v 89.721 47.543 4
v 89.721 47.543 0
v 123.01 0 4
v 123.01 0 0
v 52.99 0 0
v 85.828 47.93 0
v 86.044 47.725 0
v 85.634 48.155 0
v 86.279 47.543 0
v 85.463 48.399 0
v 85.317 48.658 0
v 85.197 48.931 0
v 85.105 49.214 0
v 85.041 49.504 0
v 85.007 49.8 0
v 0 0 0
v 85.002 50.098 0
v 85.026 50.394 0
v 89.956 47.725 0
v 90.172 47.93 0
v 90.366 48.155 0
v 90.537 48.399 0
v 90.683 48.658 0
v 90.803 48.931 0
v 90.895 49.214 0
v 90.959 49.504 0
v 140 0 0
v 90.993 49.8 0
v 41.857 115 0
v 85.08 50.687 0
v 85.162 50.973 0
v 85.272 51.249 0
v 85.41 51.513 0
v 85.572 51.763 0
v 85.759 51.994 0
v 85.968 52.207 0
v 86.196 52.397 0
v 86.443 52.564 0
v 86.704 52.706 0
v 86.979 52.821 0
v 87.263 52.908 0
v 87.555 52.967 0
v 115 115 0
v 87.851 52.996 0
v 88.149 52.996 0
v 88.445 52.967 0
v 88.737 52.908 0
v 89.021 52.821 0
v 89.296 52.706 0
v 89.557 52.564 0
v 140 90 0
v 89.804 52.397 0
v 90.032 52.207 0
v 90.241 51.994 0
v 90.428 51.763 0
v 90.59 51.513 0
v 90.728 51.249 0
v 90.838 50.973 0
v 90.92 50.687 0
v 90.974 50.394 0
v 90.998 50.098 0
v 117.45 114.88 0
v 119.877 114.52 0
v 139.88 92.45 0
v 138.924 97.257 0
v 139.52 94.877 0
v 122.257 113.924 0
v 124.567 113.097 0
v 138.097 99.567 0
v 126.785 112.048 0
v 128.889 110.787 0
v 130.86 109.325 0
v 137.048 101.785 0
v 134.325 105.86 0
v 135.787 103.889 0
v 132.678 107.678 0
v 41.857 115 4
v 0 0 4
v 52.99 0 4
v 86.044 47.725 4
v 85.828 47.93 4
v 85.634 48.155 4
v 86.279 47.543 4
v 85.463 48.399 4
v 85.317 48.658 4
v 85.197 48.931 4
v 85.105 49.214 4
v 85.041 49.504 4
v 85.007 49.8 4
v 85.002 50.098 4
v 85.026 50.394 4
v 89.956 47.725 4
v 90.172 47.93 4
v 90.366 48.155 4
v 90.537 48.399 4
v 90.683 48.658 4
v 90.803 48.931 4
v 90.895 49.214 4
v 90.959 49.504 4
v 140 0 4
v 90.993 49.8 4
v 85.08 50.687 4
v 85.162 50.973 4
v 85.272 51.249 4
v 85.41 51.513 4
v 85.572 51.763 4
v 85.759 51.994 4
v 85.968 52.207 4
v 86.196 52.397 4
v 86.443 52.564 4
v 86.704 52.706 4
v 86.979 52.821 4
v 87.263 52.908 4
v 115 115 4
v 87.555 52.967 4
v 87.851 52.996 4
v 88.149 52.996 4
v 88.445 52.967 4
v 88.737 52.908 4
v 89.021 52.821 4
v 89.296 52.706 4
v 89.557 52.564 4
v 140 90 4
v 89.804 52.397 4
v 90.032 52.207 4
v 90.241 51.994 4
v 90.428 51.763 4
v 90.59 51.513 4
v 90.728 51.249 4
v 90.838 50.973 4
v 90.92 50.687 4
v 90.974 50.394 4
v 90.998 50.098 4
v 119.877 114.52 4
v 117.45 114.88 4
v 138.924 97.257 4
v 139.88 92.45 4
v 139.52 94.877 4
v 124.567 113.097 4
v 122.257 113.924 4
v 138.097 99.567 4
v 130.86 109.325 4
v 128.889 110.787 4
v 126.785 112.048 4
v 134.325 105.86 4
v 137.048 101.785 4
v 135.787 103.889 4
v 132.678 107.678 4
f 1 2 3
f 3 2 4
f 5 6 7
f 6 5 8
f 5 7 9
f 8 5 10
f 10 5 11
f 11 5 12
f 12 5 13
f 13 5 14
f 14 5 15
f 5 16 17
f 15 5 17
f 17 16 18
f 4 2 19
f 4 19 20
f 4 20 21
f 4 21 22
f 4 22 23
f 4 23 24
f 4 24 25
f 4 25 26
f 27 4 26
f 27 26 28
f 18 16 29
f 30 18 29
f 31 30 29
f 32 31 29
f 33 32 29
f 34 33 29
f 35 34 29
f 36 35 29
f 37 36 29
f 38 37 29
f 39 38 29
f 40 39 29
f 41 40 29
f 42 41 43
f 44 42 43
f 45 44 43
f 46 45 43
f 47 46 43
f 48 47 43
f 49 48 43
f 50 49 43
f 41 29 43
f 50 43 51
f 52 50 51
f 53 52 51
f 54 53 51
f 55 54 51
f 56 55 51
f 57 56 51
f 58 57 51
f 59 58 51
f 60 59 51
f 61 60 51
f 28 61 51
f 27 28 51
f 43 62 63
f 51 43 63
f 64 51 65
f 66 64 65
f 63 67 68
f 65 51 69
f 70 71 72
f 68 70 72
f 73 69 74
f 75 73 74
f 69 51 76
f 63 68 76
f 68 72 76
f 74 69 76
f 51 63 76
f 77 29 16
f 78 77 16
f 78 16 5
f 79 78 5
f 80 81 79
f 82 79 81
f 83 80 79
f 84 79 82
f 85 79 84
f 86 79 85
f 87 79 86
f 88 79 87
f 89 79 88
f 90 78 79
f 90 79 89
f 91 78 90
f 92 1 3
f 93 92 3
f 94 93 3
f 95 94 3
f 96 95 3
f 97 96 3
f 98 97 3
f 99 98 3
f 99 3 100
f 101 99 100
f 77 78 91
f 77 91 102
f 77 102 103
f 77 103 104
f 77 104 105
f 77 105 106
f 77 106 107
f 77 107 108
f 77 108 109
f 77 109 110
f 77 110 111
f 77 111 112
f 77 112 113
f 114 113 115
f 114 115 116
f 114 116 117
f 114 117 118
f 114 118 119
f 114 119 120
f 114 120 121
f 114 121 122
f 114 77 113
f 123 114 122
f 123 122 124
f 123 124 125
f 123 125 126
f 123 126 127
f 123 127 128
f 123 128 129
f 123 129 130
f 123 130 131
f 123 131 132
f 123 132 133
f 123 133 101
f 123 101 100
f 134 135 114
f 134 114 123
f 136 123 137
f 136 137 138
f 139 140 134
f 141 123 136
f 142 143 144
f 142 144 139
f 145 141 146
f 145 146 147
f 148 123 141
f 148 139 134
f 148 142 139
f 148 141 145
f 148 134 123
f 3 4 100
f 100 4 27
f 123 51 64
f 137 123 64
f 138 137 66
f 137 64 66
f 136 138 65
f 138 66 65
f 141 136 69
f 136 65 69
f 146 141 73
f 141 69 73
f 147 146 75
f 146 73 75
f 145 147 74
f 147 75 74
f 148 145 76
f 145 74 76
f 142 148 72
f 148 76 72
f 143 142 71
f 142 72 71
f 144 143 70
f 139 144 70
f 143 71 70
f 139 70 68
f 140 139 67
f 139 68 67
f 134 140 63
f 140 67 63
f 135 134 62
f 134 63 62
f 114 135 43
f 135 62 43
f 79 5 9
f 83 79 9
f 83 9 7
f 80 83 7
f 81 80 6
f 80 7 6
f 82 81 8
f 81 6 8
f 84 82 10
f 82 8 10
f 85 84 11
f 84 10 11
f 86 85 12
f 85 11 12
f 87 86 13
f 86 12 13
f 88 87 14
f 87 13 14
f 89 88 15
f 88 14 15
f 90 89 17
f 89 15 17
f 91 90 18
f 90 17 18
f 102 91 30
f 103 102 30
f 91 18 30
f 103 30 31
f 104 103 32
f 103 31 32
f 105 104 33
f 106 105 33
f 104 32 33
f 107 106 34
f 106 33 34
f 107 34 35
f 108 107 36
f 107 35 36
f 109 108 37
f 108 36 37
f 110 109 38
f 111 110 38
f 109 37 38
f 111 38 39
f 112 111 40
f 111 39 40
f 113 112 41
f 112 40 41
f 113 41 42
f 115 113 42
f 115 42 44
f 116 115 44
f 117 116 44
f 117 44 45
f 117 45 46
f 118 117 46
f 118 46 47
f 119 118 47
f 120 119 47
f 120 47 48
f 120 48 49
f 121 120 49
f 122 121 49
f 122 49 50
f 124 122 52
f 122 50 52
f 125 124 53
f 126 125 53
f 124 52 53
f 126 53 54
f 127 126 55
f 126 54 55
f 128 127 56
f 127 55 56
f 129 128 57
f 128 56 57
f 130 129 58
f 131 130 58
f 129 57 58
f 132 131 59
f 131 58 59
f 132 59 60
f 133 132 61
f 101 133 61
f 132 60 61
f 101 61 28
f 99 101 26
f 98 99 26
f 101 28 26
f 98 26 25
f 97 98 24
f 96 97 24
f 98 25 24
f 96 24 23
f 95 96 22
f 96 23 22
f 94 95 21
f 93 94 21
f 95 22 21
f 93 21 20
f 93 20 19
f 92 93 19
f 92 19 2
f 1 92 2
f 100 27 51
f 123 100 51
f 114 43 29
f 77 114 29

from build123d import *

# Parameters (mm, degrees)
AUFSATZ_LINEAR_AUSTRAGEN1_DEPTH = 4


with BuildPart() as part:
    # Skizze1 → Aufsatz-Linear austragen1 (new body)
    with BuildSketch(Plane.XY):
        with BuildLine():
            Line((0, 0), (52.98962309, 0))
            Line((52.98962309, 0), (86.279270691, 47.542543867))
            ThreePointArc((86.279270691, 47.542543867), (88, 53), (89.720729309, 47.542543867))
            Line((89.720729309, 47.542543867), (123.01037691, 0))
            Line((123.01037691, 0), (140, 0))
            Line((140, 0), (140, 90))
            ThreePointArc((140, 90), (132.67766953, 107.67766953), (115, 115))
            Line((115, 115), (41.856576941, 115))
            Line((41.856576941, 115), (0, 0))
        make_face()
    extrude(amount=AUFSATZ_LINEAR_AUSTRAGEN1_DEPTH)


solid = part.part
